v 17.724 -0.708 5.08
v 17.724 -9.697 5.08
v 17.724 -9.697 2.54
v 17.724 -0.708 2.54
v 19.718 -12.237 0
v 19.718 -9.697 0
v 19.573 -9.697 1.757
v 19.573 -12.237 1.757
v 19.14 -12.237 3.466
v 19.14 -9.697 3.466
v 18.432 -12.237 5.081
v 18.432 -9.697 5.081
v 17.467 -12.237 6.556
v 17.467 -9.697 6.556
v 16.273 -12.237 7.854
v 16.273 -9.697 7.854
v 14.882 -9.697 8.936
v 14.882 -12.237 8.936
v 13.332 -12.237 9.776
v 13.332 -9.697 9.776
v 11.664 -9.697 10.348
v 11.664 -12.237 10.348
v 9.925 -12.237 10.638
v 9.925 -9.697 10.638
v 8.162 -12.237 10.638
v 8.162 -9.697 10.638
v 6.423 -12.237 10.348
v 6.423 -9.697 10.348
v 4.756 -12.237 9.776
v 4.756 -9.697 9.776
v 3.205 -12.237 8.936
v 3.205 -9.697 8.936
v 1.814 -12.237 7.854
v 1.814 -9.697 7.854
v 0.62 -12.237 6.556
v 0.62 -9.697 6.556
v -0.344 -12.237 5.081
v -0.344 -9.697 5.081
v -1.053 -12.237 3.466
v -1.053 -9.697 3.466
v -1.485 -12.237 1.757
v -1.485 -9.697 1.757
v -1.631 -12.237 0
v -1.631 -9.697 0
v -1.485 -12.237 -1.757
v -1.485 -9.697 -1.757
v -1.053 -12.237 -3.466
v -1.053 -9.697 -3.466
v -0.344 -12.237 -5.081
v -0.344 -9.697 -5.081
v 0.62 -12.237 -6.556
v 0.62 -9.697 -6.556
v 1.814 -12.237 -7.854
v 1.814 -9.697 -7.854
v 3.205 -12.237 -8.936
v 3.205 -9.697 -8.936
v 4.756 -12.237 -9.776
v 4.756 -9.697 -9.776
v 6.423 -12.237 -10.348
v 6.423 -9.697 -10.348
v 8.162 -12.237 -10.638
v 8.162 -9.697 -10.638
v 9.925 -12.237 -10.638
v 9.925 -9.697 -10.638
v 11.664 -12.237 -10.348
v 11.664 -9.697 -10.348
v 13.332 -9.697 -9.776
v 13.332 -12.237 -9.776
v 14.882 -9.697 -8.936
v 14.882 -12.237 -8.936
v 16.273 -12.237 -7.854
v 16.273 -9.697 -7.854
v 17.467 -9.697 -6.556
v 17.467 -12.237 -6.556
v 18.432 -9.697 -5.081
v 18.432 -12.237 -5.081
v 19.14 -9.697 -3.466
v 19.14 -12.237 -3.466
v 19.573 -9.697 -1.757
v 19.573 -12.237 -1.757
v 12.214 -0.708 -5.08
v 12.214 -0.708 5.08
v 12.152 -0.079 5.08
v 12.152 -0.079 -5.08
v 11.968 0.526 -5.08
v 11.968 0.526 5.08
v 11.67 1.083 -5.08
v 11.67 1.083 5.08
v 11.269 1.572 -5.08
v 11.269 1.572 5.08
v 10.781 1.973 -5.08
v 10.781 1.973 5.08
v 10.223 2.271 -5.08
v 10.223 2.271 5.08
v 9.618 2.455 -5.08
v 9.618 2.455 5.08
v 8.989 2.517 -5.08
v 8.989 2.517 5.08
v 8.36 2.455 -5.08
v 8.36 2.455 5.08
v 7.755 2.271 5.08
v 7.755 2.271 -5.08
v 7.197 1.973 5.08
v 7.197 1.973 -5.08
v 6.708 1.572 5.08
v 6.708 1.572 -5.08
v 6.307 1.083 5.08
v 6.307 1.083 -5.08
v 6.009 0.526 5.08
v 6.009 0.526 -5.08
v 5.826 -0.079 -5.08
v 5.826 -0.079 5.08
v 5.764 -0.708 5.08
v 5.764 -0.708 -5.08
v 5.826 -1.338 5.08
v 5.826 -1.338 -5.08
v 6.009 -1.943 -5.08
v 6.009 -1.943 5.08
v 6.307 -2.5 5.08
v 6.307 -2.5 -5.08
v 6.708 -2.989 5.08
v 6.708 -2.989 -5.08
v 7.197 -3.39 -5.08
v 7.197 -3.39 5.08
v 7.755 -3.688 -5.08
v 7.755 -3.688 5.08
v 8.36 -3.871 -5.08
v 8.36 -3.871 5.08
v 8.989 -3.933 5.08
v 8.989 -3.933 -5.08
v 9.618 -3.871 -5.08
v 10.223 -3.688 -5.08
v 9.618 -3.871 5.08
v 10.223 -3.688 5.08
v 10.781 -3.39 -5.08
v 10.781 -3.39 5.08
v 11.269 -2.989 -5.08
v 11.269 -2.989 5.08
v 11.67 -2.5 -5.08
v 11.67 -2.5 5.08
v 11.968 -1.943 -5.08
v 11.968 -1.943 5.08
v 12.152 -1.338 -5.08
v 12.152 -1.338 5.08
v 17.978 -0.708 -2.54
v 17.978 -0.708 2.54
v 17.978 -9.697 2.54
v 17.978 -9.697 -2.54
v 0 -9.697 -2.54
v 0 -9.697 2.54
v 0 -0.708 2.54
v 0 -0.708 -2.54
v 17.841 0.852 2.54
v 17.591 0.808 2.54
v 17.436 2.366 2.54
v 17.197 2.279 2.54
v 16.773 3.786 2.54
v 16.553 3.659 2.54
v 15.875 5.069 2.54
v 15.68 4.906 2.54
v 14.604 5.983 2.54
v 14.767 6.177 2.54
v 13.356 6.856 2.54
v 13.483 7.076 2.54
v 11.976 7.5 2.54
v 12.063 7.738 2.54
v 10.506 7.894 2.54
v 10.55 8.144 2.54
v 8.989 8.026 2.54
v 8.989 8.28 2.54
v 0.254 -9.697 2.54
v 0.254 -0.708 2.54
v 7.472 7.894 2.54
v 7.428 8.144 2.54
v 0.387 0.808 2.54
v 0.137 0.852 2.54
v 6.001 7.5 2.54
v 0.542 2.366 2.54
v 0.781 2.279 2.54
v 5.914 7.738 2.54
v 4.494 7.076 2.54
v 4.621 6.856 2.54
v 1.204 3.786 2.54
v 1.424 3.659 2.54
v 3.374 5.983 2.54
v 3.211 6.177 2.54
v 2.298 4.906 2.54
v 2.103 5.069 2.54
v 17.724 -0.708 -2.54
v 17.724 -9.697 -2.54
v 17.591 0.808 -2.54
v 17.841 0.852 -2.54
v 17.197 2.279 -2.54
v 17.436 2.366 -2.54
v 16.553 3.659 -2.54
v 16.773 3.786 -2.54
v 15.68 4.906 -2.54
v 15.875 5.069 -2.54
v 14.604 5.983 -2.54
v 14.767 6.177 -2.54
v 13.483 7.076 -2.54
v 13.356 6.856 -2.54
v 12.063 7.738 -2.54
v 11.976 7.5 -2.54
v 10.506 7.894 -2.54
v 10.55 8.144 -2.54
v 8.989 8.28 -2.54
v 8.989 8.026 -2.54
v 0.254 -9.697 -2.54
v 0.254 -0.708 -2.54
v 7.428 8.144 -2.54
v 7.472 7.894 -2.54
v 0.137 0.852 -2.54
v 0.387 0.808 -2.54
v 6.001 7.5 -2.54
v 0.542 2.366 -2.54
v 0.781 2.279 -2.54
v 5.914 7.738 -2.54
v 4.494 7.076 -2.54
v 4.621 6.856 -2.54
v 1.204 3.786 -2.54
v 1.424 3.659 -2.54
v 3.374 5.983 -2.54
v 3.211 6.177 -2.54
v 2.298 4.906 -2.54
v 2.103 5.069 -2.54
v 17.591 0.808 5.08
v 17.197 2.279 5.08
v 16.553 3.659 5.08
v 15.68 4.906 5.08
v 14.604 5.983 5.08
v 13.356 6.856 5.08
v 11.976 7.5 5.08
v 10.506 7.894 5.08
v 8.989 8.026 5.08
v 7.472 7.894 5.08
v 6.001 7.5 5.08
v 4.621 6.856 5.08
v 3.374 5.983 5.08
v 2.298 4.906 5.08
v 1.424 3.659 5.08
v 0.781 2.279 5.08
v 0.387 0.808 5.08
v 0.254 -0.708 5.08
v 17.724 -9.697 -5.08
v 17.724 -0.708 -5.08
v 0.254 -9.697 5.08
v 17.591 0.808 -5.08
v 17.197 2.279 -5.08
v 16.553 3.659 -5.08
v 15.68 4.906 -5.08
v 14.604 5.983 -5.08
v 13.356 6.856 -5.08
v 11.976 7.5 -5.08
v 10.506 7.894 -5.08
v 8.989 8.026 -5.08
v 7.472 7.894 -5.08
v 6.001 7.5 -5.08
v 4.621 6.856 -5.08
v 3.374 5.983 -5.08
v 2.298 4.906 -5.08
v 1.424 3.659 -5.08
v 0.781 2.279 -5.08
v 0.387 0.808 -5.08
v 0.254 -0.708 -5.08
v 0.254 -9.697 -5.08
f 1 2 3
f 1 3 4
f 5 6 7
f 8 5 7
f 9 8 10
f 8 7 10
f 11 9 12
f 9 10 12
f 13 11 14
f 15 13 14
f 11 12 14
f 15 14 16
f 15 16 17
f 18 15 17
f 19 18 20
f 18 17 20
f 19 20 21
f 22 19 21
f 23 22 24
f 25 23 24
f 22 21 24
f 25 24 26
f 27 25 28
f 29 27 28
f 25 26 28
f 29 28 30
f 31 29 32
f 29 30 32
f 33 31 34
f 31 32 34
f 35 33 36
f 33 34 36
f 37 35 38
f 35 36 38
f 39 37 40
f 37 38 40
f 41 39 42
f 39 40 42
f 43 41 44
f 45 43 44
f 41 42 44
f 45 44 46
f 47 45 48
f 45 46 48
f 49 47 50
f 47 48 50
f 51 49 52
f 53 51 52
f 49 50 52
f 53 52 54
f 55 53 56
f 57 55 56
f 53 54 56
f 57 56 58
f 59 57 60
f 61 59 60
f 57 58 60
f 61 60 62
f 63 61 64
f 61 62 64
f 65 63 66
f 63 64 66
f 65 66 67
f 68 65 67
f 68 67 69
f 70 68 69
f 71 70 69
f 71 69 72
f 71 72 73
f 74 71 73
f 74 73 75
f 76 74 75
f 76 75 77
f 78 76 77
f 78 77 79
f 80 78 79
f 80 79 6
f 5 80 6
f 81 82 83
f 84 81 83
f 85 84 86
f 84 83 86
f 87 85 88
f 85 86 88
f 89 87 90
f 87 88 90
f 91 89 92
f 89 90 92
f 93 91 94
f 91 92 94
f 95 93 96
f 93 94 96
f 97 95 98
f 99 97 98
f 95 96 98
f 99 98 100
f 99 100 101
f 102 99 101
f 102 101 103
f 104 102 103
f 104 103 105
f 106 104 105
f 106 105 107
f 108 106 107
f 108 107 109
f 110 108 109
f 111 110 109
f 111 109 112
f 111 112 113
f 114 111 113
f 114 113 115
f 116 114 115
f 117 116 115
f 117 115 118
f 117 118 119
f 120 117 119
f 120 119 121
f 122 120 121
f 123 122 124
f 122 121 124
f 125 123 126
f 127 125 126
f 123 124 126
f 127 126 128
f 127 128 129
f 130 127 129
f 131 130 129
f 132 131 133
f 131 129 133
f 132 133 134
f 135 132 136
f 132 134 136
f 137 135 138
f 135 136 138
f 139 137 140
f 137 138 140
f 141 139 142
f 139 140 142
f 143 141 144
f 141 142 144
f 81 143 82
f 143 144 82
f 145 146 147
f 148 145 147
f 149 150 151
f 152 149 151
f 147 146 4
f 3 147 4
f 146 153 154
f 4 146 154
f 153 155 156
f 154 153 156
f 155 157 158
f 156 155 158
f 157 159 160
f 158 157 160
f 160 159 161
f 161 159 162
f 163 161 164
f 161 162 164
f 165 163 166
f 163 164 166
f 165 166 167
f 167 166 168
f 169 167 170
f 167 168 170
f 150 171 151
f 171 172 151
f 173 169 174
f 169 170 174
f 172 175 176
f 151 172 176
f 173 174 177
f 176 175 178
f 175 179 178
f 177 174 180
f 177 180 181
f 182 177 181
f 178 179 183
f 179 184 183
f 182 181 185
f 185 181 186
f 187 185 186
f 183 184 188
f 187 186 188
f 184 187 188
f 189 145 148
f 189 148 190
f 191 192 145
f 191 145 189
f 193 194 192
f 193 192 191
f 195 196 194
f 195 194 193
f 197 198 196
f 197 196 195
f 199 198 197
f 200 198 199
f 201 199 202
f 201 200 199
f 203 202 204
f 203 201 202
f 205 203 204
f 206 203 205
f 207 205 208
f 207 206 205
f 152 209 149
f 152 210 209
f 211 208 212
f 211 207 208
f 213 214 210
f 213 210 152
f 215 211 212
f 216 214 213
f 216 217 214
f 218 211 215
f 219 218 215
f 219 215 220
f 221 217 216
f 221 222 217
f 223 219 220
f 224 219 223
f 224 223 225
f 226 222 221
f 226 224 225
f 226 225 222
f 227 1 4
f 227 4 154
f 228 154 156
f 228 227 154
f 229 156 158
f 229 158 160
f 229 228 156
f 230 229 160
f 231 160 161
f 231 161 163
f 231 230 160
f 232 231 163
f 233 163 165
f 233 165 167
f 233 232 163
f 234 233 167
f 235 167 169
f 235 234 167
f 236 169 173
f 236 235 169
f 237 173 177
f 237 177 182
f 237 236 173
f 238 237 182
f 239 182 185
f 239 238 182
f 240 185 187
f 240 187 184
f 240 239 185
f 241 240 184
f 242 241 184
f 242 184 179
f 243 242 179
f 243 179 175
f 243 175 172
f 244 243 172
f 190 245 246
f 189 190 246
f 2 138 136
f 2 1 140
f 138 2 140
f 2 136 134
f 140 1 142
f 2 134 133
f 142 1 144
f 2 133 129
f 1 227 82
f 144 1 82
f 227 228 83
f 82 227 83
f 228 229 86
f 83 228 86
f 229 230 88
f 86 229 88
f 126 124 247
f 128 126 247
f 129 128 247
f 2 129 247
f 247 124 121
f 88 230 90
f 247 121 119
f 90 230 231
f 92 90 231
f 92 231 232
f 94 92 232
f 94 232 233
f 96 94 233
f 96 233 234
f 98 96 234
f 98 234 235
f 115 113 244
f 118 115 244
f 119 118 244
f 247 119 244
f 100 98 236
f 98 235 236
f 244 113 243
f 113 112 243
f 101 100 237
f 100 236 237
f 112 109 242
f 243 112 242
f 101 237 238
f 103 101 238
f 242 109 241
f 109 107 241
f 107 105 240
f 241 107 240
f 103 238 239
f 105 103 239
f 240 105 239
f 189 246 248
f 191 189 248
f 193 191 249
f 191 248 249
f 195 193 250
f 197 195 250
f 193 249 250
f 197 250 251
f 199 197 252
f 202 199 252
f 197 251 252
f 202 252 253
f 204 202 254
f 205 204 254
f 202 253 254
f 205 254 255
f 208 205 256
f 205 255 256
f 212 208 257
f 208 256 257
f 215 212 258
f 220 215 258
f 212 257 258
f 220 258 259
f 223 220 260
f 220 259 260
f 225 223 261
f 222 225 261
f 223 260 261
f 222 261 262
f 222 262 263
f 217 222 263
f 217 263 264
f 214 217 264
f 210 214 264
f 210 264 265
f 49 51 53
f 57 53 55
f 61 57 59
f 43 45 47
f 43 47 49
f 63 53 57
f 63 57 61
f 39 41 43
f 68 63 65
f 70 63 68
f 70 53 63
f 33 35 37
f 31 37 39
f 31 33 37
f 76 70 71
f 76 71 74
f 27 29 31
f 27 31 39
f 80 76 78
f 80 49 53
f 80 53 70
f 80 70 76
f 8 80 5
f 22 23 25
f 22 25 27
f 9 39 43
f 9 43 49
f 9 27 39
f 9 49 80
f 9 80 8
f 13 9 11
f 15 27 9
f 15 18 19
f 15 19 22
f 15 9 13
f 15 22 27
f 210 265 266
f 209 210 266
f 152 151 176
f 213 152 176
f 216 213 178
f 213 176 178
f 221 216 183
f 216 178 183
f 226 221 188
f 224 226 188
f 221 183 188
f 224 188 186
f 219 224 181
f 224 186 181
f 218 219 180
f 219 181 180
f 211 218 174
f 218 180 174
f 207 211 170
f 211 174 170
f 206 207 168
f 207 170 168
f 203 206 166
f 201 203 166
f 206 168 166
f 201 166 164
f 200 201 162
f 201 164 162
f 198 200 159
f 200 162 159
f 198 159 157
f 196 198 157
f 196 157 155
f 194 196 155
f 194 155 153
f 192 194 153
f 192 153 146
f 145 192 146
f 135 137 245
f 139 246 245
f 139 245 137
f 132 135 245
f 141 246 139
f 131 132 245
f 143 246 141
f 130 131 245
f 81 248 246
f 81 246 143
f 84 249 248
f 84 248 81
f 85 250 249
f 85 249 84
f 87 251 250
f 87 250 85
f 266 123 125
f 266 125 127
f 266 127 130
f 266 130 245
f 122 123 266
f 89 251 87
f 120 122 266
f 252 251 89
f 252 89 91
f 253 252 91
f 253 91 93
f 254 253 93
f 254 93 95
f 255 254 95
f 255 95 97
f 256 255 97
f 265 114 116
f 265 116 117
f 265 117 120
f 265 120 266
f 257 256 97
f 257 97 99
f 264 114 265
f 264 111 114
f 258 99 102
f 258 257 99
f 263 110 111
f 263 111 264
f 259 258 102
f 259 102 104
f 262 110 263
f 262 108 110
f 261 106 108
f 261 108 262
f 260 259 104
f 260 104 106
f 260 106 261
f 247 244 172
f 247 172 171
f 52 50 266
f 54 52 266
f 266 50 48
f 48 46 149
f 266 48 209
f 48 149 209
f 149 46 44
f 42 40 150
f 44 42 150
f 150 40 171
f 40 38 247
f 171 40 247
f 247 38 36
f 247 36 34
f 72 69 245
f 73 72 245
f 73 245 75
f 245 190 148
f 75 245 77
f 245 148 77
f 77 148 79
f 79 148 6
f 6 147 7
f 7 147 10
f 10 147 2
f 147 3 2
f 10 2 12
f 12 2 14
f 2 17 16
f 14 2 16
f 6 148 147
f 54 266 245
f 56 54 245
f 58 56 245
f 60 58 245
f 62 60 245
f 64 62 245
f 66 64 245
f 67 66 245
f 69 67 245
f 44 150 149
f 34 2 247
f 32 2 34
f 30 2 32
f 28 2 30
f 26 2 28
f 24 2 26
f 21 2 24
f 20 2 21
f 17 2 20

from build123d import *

# Parameters (mm, degrees)
EXTRUDE1_DEPTH     = 5.08
SKETCH4_R          = 10.674627582
EXTRUDE2_DEPTH     = 2.54
SKETCH6_R          = 3.225
CUT_EXTRUDE1_DEPTH = 29.049397538
EXTRUDE3_DEPTH     = 2.54


with BuildPart() as part:
    # Sketch3 → Extrude1 (new, symmetric)
    with BuildSketch(Plane.XY):
        with BuildLine():
            Line((17.977749936, -9.697339402), (0, -9.697339402))
            Line((0, -9.697339402), (0, -0.708464433))
            ThreePointArc((0, -0.708464433), (8.988874968, 8.280410535), (17.977749936, -0.708464433))
            Line((17.977749936, -0.708464433), (17.977749936, -9.697339402))
        make_face()
    extrude(amount=EXTRUDE1_DEPTH, both=True)

    # Sketch4 → Extrude2 (add)
    with BuildSketch(Plane.XZ.offset(9.697339402)):
        with Locations((9.043585733, 0)):
            Circle(SKETCH4_R)
    extrude(amount=EXTRUDE2_DEPTH)

    # Sketch6 → Cut-Extrude1 (cut, through all)
    with BuildSketch(Plane.XY.offset(5.08)):
        with Locations((8.988874968, -0.708464433)):
            Circle(SKETCH6_R)
    extrude(amount=-CUT_EXTRUDE1_DEPTH, mode=Mode.SUBTRACT)

    # Sketch8 → Extrude3 (cut)
    with BuildSketch(Plane.XY.offset(5.08)):
        with BuildLine():
            Line((0.254, -9.697339402), (0, -9.697339402))
            Line((0, -9.697339402), (0, -0.708464433))
            ThreePointArc((0, -0.708464433), (8.988874968, 8.280410535), (17.977749936, -0.708464433))
            Line((17.977749936, -0.708464433), (17.977749936, -9.697339402))
            Line((17.977749936, -9.697339402), (17.723749936, -9.697339402))
            Line((17.723749936, -9.697339402), (17.723749936, -0.708464433))
            ThreePointArc((17.723749936, -0.708464433), (8.988874968, 8.026410535), (0.254, -0.708464433))
            Line((0.254, -0.708464433), (0.254, -9.697339402))
        make_face()
    extrude3 = extrude(amount=-EXTRUDE3_DEPTH, mode=Mode.SUBTRACT)

    # Mirror1: Extrude3 across plane
    add(extrude3.mirror(Plane.XY), mode=Mode.SUBTRACT)


solid = part.part
